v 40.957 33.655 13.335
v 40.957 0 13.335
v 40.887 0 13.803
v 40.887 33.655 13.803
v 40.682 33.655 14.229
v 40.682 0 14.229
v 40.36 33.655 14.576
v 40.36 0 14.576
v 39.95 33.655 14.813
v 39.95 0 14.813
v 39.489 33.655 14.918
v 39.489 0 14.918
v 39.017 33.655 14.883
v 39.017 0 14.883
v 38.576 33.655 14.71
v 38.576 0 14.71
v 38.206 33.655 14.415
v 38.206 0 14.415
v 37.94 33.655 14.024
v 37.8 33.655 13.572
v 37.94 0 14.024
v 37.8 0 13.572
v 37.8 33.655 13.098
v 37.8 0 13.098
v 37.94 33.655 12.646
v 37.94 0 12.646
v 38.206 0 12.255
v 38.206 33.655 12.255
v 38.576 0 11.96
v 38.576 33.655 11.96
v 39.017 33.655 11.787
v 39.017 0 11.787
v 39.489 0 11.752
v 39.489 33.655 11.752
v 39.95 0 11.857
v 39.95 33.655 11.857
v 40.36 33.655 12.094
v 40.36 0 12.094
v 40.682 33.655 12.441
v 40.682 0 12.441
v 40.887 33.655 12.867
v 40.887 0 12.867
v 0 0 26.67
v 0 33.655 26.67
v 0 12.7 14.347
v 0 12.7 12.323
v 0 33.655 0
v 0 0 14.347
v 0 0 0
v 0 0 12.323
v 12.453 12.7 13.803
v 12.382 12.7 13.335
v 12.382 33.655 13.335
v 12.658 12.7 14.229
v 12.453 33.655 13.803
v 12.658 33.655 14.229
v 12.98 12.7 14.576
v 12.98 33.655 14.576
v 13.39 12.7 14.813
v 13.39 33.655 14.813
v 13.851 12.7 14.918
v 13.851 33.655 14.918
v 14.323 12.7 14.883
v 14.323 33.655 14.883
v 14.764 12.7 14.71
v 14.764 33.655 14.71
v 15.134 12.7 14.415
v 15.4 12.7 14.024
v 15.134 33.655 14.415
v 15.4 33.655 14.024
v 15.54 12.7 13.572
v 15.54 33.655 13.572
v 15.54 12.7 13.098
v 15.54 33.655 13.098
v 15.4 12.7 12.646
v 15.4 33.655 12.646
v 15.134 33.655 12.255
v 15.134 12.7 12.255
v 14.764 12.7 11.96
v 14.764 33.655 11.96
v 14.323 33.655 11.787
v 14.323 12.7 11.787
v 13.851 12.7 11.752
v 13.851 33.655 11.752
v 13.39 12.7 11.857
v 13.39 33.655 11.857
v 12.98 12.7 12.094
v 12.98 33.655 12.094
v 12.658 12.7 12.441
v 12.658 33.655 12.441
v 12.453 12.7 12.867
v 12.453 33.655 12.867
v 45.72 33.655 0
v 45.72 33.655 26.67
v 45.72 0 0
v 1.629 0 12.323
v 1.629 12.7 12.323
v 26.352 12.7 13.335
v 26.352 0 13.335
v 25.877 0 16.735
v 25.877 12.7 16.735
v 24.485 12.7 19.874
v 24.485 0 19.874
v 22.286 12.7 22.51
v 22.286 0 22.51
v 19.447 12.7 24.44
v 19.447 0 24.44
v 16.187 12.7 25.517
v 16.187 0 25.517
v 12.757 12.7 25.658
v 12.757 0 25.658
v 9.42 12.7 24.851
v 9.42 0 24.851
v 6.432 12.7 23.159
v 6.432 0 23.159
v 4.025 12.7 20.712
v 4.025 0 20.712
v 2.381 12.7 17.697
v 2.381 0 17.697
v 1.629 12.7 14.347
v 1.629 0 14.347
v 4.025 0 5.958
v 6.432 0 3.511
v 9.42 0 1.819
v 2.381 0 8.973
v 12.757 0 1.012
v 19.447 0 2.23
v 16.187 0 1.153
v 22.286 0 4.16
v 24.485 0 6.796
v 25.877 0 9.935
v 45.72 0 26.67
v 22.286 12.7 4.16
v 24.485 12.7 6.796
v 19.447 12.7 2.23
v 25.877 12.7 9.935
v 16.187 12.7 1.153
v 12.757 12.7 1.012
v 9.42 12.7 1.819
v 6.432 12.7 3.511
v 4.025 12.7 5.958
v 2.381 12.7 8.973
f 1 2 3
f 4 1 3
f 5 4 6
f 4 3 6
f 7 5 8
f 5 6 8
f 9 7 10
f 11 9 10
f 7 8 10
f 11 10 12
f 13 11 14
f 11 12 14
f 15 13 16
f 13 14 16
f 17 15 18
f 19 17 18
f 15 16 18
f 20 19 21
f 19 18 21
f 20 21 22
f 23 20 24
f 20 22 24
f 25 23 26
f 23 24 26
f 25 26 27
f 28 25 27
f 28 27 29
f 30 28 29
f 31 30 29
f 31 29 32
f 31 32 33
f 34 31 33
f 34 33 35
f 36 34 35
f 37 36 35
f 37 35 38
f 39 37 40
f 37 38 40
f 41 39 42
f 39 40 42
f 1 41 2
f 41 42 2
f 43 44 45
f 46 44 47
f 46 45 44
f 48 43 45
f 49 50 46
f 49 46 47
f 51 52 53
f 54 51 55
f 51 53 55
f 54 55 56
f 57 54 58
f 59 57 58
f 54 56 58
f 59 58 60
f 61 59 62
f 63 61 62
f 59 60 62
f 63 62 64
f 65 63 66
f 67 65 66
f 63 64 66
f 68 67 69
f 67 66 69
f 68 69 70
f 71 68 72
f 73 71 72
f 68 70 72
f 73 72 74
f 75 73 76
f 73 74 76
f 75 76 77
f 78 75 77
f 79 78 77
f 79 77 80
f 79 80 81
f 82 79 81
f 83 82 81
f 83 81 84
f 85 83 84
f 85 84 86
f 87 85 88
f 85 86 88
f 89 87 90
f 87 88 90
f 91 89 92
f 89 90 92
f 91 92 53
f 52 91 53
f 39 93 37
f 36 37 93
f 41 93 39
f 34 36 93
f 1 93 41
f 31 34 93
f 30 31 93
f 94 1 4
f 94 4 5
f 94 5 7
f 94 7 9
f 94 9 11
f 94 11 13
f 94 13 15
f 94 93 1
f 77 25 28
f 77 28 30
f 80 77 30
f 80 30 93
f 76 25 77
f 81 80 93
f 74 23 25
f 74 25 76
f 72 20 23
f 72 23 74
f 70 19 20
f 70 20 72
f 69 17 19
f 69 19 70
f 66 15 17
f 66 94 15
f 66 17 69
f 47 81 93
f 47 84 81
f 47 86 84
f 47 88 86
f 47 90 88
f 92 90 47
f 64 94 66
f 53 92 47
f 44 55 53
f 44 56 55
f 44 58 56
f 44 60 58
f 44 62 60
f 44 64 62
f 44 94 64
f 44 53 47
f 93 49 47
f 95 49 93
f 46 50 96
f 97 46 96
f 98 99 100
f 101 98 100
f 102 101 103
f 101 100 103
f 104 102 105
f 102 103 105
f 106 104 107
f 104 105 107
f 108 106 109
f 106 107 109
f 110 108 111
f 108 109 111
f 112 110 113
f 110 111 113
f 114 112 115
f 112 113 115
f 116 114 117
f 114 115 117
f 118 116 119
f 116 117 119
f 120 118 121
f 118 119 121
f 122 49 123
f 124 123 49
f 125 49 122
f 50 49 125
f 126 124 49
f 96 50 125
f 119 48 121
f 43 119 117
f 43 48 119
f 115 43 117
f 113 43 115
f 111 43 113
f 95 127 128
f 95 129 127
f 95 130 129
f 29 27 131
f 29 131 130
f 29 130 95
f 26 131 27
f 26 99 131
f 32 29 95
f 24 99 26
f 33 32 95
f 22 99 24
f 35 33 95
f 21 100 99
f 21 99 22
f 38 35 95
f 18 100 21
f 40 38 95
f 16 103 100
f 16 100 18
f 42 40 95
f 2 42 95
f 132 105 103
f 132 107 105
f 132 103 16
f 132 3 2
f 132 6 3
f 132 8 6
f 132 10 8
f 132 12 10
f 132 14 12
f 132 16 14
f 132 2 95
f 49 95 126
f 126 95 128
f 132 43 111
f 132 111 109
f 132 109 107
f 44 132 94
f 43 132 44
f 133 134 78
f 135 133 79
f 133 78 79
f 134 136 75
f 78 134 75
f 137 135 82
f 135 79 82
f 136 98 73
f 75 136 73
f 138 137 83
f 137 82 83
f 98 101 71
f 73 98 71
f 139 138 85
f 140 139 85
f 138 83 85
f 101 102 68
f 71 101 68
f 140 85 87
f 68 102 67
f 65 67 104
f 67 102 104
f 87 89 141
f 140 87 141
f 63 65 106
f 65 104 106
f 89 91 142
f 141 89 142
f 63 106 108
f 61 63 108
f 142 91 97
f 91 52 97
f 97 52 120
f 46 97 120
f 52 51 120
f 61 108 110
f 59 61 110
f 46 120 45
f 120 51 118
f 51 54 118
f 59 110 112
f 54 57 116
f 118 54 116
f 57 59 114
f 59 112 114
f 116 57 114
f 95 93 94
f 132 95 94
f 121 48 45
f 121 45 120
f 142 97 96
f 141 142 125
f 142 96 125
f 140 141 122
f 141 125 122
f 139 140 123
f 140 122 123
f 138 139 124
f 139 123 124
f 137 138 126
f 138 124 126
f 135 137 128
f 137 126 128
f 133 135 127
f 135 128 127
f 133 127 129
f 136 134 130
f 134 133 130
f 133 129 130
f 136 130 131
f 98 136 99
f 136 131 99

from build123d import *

# Parameters (mm, degrees)
F0_R     = 1.5875
F0_R_2   = 12.3825
F1_DEPTH = 33.655
F2_W     = 6.016172
F2_H     = 2.024958
F3_DEPTH = 12.7
F4_R     = 12.3825
F4_R_2   = 1.5875
F5_DEPTH = 20.955


with BuildPart() as f1:
    # F0 (on Front) → F1 (new body)
    with BuildSketch(Plane.XZ):
        with BuildLine():
            ThreePointArc((40.760279, 16.387484), (36.015898, 13.31191), (40.802172, 10.301946))
            ThreePointArc((40.802172, 10.301946), (42.203223, 11.539621), (42.724182, 13.335))
            ThreePointArc((42.724182, 13.335), (42.190796, 15.14984), (40.760279, 16.387484))
        make_face()
        with Locations((39.37, 13.335)):
            Circle(F0_R, mode=Mode.SUBTRACT)
        with BuildLine():
            ThreePointArc((23.614713, 2.18623), (22.009207, 0.978353), (20.254373, 0))
            Line((20.254373, 0), (45.72, 0))
            Line((45.72, 0), (45.72, 26.67))
            Line((45.72, 26.67), (20.254373, 26.67))
            ThreePointArc((20.254373, 26.67), (22.360042, 25.45617), (24.237647, 23.912854))
            Line((24.237647, 23.912854), (40.760279, 16.387484))
            ThreePointArc((40.760279, 16.387484), (42.190796, 15.14984), (42.724182, 13.335))
            ThreePointArc((42.724182, 13.335), (42.203223, 11.539621), (40.802172, 10.301946))
            Line((40.802172, 10.301946), (23.614713, 2.18623))
        make_face()
        with BuildLine():
            ThreePointArc((0, 8.628126), (2.962228, 3.529669), (7.685627, 0))
            Line((7.685627, 0), (20.254373, 0))
            ThreePointArc((20.254373, 0), (22.009207, 0.978353), (23.614713, 2.18623))
            ThreePointArc((23.614713, 2.18623), (27.376982, 7.205693), (28.711627, 13.335))
            ThreePointArc((28.711627, 13.335), (27.547139, 19.077549), (24.237647, 23.912854))
            ThreePointArc((24.237647, 23.912854), (22.360042, 25.45617), (20.254373, 26.67))
            Line((20.254373, 26.67), (7.685627, 26.67))
            ThreePointArc((7.685627, 26.67), (2.962228, 23.140331), (0, 18.041874))
            Line((0, 18.041874), (0, 8.628126))
        make_face()
        with Locations((13.97, 13.335)):
            Circle(F0_R_2, mode=Mode.SUBTRACT)
        with BuildLine():
            Line((0, 26.67), (0, 18.041874))
            ThreePointArc((0, 18.041874), (2.962228, 23.140331), (7.685627, 26.67))
            Line((7.685627, 26.67), (0, 26.67))
        make_face()
        with BuildLine():
            Line((0, 8.628126), (0, 0))
            Line((0, 0), (7.685627, 0))
            ThreePointArc((7.685627, 0), (2.962228, 3.529669), (0, 8.628126))
        make_face()
        with BuildLine():
            ThreePointArc((28.711627, 13.335), (27.376982, 7.205693), (23.614713, 2.18623))
            Line((23.614713, 2.18623), (40.802172, 10.301946))
            ThreePointArc((40.802172, 10.301946), (36.015898, 13.31191), (40.760279, 16.387484))
            Line((40.760279, 16.387484), (24.237647, 23.912854))
            ThreePointArc((24.237647, 23.912854), (27.547139, 19.077549), (28.711627, 13.335))
        make_face()
    extrude(amount=-F1_DEPTH)

    # F2 (on face) → F3 (cut)
    with BuildSketch(Plane.XZ):
        with Locations((0, 13.335)):
            Rectangle(F2_W, F2_H)
    extrude(amount=-F3_DEPTH, mode=Mode.SUBTRACT)

    # F4 (on face) → F5 (join)
    with BuildSketch(Plane(origin=(0, 33.655, 0), x_dir=(-1, 0, 0), z_dir=(0, 1, 0))):
        with Locations((-13.97, 13.335)):
            Circle(F4_R)
        with Locations((-13.97, 13.335)):
            Circle(F4_R_2, mode=Mode.SUBTRACT)
    extrude(amount=-F5_DEPTH)


solid = f1.part
